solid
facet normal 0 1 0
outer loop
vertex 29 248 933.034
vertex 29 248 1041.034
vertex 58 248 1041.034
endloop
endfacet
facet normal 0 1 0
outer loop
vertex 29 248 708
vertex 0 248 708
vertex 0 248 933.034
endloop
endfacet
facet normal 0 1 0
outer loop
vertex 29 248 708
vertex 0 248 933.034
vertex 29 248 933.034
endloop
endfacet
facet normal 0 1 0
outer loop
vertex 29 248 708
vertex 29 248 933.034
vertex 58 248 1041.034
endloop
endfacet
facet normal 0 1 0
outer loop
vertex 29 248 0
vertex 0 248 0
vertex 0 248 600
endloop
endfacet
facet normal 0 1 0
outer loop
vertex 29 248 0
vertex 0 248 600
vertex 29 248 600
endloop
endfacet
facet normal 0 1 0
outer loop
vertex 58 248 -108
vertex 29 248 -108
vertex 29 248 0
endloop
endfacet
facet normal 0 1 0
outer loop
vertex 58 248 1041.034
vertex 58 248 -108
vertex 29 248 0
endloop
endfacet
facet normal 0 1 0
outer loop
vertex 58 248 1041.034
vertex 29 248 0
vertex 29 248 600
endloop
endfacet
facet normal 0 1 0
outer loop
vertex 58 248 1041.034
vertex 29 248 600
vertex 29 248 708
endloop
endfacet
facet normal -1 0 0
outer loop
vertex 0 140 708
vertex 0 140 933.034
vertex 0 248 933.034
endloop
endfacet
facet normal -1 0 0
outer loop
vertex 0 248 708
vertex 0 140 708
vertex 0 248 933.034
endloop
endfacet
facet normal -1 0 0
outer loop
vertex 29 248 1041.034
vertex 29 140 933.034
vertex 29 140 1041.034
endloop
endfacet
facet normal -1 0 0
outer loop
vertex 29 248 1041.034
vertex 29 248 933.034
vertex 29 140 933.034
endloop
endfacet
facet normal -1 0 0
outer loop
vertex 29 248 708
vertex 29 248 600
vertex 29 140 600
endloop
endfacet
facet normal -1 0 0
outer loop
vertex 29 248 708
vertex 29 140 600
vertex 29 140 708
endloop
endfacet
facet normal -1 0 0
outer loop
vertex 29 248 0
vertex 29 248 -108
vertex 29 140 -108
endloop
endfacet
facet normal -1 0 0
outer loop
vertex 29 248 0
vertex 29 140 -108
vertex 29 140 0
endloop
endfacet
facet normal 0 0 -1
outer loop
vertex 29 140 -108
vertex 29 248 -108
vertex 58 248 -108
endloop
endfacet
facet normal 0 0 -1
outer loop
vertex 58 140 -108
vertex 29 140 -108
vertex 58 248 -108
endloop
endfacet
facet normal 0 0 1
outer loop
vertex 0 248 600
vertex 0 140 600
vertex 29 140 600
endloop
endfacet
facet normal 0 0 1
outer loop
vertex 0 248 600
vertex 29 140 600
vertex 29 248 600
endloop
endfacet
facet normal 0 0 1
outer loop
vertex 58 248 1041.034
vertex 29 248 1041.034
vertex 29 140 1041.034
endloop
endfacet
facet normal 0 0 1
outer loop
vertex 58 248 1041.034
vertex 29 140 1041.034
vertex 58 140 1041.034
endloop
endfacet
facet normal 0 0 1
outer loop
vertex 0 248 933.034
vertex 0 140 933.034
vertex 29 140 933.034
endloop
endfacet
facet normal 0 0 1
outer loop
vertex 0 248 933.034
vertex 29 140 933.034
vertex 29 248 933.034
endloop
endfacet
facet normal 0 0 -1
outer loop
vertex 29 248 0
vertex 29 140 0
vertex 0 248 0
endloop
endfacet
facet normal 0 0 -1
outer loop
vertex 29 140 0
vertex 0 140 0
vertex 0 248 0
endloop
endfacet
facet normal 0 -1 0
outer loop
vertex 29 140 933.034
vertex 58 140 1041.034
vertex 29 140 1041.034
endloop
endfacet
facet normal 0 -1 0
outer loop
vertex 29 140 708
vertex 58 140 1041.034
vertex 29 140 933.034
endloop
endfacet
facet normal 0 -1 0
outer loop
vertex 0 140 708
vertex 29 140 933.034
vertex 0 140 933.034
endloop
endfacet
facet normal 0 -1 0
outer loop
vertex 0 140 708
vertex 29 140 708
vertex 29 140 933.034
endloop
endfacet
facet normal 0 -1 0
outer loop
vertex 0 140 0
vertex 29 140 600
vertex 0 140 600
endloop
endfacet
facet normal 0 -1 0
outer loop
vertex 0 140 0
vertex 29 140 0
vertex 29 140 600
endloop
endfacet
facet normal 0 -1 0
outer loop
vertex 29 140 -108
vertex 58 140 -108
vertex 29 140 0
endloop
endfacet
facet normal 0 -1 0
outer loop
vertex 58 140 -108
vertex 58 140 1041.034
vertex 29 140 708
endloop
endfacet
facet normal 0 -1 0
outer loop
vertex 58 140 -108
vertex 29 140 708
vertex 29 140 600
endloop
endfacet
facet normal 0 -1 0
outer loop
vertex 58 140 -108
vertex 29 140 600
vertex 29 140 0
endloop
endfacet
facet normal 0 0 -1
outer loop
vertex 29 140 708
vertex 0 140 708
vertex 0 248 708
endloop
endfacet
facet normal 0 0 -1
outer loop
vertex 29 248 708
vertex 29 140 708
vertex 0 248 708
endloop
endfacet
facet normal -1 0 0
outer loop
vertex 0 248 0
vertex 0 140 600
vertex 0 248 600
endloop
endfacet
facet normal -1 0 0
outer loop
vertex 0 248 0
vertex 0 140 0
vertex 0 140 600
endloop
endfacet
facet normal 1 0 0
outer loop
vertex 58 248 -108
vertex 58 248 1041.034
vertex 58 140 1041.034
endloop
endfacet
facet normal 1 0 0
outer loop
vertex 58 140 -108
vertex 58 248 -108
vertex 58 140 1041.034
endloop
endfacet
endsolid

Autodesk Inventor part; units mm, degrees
ref_plane "Work Plane1" through (0, 0, 0) normal (0, 0, 1) x (1, 0, 0)
sketch "Sketch1" plane through (0, 0, 0) normal (0, 0, 1) x (1, 0, 0)
  line L0 (29, 140) -> (29, 248) projected
  line L1 (29, 248) -> (58, 248) projected
  line L2 (29, 248) -> (58, 248) projected
  line L3 (58, 248) -> (58, 410) projected
  line L4 (0, 410) -> (58, 410) projected
  line L5 (0, -410) -> (0, 410) projected
  line L6 (58, -410) -> (0, -410) projected
  line L7 (58, -410) -> (58, -252) projected
  line L8 (58, -252) -> (29, -252) projected
  line L9 (29, -252) -> (29, -144) projected
  line L10 (29, -144) -> (58, -144) projected
  line L11 (58, -144) -> (58, 140) projected
  line L12 (58, 140) -> (29, 140) projected
  line L13 (29, 140) -> (29, 248) projected
  line L14 (58, 140) -> (29, 140) projected
  line L15 (58, 140) -> (0, 140)
  line L16 (0, 140) -> (0, 248)
  line L17 (0, 248) -> (58, 248)
  line L18 (58, 248) -> (58, 140)
  point P0 (0, 0)
ref_plane "Work Plane2" through (0, -410, -108) normal (0, 0, -1) x (0, 1, 0)
ref_plane "Work Plane3" through (0, -410, 1041.034) normal (0, 0, 1) x (1, 0, 0)
extrude "Extrusion1" add sketch "Sketch1" along normal up to surface (1149.034 mm away) from surface at -108 contours L15 L5 L17 L0 | L0 L1 L18 L12
sketch "Sketch2" plane through (0, 140, 1041.034) normal (-1, 0, 0) x (0, 0, 1)
  line L0 (-1041.034, -550) -> (-1041.034, 270) projected
  line L1 (-1149.034, 270) -> (-1041.034, 270) projected
  line L2 (-1149.034, -550) -> (-1149.034, 270) projected
  line L3 (-1041.034, -550) -> (-1149.034, -550) projected
  line L4 (-333.034, -550) -> (-333.034, 270) projected
  line L5 (-441.034, 270) -> (-333.034, 270) projected
  line L6 (-441.034, -550) -> (-441.034, 270) projected
  line L7 (-333.034, -550) -> (-441.034, -550) projected
  line L8 (0, -550) -> (0, 270) projected
  line L9 (-108, 270) -> (0, 270) projected
  line L10 (-108, -550) -> (-108, 270) projected
  line L11 (0, -550) -> (-108, -550) projected
  line L12 (0, 0) -> (0, 108) projected
  line L13 (-1149.034, 108) -> (0, 108) projected
  line L14 (-1149.034, 108) -> (-1149.034, 0) projected
  line L15 (-1149.034, 0) -> (0, 0) projected
  line L16 (-1041.034, 0) -> (-1149.034, 0)
  line L17 (-1149.034, 0) -> (-1149.034, 108)
  line L18 (-1149.034, 108) -> (-1041.034, 108)
  line L19 (-1041.034, 108) -> (-1041.034, 0)
  line L20 (-1149.034, 108) -> (0, 108) projected
  line L21 (-441.034, 108) -> (-333.034, 108)
  line L22 (-333.034, 108) -> (-333.034, 0)
  line L23 (-333.034, 0) -> (-441.034, 0)
  line L24 (-441.034, 0) -> (-441.034, 108)
  line L25 (-1149.034, 0) -> (0, 0) projected
  line L26 (0, 0) -> (0, 108) projected
  line L27 (-108, 0) -> (0, 0)
  line L28 (0, 0) -> (0, 108)
  line L29 (0, 108) -> (-108, 108)
  line L30 (-108, 108) -> (-108, 0)
  point P0 (-1041.034, -140)
ref_plane "Work Plane4" through (29, 140, 933.034) normal (1, 0, 0) x (0, 1, 0)
extrude "Extrusion2" cut sketch "Sketch2" against normal up to surface (29 mm away) contours L15 L2 L13 L0 | L6 L13 L4 L15 | L10 L13 L8 L15
properties part number "horizontalUnderSink" material "Wood (Birch)"
